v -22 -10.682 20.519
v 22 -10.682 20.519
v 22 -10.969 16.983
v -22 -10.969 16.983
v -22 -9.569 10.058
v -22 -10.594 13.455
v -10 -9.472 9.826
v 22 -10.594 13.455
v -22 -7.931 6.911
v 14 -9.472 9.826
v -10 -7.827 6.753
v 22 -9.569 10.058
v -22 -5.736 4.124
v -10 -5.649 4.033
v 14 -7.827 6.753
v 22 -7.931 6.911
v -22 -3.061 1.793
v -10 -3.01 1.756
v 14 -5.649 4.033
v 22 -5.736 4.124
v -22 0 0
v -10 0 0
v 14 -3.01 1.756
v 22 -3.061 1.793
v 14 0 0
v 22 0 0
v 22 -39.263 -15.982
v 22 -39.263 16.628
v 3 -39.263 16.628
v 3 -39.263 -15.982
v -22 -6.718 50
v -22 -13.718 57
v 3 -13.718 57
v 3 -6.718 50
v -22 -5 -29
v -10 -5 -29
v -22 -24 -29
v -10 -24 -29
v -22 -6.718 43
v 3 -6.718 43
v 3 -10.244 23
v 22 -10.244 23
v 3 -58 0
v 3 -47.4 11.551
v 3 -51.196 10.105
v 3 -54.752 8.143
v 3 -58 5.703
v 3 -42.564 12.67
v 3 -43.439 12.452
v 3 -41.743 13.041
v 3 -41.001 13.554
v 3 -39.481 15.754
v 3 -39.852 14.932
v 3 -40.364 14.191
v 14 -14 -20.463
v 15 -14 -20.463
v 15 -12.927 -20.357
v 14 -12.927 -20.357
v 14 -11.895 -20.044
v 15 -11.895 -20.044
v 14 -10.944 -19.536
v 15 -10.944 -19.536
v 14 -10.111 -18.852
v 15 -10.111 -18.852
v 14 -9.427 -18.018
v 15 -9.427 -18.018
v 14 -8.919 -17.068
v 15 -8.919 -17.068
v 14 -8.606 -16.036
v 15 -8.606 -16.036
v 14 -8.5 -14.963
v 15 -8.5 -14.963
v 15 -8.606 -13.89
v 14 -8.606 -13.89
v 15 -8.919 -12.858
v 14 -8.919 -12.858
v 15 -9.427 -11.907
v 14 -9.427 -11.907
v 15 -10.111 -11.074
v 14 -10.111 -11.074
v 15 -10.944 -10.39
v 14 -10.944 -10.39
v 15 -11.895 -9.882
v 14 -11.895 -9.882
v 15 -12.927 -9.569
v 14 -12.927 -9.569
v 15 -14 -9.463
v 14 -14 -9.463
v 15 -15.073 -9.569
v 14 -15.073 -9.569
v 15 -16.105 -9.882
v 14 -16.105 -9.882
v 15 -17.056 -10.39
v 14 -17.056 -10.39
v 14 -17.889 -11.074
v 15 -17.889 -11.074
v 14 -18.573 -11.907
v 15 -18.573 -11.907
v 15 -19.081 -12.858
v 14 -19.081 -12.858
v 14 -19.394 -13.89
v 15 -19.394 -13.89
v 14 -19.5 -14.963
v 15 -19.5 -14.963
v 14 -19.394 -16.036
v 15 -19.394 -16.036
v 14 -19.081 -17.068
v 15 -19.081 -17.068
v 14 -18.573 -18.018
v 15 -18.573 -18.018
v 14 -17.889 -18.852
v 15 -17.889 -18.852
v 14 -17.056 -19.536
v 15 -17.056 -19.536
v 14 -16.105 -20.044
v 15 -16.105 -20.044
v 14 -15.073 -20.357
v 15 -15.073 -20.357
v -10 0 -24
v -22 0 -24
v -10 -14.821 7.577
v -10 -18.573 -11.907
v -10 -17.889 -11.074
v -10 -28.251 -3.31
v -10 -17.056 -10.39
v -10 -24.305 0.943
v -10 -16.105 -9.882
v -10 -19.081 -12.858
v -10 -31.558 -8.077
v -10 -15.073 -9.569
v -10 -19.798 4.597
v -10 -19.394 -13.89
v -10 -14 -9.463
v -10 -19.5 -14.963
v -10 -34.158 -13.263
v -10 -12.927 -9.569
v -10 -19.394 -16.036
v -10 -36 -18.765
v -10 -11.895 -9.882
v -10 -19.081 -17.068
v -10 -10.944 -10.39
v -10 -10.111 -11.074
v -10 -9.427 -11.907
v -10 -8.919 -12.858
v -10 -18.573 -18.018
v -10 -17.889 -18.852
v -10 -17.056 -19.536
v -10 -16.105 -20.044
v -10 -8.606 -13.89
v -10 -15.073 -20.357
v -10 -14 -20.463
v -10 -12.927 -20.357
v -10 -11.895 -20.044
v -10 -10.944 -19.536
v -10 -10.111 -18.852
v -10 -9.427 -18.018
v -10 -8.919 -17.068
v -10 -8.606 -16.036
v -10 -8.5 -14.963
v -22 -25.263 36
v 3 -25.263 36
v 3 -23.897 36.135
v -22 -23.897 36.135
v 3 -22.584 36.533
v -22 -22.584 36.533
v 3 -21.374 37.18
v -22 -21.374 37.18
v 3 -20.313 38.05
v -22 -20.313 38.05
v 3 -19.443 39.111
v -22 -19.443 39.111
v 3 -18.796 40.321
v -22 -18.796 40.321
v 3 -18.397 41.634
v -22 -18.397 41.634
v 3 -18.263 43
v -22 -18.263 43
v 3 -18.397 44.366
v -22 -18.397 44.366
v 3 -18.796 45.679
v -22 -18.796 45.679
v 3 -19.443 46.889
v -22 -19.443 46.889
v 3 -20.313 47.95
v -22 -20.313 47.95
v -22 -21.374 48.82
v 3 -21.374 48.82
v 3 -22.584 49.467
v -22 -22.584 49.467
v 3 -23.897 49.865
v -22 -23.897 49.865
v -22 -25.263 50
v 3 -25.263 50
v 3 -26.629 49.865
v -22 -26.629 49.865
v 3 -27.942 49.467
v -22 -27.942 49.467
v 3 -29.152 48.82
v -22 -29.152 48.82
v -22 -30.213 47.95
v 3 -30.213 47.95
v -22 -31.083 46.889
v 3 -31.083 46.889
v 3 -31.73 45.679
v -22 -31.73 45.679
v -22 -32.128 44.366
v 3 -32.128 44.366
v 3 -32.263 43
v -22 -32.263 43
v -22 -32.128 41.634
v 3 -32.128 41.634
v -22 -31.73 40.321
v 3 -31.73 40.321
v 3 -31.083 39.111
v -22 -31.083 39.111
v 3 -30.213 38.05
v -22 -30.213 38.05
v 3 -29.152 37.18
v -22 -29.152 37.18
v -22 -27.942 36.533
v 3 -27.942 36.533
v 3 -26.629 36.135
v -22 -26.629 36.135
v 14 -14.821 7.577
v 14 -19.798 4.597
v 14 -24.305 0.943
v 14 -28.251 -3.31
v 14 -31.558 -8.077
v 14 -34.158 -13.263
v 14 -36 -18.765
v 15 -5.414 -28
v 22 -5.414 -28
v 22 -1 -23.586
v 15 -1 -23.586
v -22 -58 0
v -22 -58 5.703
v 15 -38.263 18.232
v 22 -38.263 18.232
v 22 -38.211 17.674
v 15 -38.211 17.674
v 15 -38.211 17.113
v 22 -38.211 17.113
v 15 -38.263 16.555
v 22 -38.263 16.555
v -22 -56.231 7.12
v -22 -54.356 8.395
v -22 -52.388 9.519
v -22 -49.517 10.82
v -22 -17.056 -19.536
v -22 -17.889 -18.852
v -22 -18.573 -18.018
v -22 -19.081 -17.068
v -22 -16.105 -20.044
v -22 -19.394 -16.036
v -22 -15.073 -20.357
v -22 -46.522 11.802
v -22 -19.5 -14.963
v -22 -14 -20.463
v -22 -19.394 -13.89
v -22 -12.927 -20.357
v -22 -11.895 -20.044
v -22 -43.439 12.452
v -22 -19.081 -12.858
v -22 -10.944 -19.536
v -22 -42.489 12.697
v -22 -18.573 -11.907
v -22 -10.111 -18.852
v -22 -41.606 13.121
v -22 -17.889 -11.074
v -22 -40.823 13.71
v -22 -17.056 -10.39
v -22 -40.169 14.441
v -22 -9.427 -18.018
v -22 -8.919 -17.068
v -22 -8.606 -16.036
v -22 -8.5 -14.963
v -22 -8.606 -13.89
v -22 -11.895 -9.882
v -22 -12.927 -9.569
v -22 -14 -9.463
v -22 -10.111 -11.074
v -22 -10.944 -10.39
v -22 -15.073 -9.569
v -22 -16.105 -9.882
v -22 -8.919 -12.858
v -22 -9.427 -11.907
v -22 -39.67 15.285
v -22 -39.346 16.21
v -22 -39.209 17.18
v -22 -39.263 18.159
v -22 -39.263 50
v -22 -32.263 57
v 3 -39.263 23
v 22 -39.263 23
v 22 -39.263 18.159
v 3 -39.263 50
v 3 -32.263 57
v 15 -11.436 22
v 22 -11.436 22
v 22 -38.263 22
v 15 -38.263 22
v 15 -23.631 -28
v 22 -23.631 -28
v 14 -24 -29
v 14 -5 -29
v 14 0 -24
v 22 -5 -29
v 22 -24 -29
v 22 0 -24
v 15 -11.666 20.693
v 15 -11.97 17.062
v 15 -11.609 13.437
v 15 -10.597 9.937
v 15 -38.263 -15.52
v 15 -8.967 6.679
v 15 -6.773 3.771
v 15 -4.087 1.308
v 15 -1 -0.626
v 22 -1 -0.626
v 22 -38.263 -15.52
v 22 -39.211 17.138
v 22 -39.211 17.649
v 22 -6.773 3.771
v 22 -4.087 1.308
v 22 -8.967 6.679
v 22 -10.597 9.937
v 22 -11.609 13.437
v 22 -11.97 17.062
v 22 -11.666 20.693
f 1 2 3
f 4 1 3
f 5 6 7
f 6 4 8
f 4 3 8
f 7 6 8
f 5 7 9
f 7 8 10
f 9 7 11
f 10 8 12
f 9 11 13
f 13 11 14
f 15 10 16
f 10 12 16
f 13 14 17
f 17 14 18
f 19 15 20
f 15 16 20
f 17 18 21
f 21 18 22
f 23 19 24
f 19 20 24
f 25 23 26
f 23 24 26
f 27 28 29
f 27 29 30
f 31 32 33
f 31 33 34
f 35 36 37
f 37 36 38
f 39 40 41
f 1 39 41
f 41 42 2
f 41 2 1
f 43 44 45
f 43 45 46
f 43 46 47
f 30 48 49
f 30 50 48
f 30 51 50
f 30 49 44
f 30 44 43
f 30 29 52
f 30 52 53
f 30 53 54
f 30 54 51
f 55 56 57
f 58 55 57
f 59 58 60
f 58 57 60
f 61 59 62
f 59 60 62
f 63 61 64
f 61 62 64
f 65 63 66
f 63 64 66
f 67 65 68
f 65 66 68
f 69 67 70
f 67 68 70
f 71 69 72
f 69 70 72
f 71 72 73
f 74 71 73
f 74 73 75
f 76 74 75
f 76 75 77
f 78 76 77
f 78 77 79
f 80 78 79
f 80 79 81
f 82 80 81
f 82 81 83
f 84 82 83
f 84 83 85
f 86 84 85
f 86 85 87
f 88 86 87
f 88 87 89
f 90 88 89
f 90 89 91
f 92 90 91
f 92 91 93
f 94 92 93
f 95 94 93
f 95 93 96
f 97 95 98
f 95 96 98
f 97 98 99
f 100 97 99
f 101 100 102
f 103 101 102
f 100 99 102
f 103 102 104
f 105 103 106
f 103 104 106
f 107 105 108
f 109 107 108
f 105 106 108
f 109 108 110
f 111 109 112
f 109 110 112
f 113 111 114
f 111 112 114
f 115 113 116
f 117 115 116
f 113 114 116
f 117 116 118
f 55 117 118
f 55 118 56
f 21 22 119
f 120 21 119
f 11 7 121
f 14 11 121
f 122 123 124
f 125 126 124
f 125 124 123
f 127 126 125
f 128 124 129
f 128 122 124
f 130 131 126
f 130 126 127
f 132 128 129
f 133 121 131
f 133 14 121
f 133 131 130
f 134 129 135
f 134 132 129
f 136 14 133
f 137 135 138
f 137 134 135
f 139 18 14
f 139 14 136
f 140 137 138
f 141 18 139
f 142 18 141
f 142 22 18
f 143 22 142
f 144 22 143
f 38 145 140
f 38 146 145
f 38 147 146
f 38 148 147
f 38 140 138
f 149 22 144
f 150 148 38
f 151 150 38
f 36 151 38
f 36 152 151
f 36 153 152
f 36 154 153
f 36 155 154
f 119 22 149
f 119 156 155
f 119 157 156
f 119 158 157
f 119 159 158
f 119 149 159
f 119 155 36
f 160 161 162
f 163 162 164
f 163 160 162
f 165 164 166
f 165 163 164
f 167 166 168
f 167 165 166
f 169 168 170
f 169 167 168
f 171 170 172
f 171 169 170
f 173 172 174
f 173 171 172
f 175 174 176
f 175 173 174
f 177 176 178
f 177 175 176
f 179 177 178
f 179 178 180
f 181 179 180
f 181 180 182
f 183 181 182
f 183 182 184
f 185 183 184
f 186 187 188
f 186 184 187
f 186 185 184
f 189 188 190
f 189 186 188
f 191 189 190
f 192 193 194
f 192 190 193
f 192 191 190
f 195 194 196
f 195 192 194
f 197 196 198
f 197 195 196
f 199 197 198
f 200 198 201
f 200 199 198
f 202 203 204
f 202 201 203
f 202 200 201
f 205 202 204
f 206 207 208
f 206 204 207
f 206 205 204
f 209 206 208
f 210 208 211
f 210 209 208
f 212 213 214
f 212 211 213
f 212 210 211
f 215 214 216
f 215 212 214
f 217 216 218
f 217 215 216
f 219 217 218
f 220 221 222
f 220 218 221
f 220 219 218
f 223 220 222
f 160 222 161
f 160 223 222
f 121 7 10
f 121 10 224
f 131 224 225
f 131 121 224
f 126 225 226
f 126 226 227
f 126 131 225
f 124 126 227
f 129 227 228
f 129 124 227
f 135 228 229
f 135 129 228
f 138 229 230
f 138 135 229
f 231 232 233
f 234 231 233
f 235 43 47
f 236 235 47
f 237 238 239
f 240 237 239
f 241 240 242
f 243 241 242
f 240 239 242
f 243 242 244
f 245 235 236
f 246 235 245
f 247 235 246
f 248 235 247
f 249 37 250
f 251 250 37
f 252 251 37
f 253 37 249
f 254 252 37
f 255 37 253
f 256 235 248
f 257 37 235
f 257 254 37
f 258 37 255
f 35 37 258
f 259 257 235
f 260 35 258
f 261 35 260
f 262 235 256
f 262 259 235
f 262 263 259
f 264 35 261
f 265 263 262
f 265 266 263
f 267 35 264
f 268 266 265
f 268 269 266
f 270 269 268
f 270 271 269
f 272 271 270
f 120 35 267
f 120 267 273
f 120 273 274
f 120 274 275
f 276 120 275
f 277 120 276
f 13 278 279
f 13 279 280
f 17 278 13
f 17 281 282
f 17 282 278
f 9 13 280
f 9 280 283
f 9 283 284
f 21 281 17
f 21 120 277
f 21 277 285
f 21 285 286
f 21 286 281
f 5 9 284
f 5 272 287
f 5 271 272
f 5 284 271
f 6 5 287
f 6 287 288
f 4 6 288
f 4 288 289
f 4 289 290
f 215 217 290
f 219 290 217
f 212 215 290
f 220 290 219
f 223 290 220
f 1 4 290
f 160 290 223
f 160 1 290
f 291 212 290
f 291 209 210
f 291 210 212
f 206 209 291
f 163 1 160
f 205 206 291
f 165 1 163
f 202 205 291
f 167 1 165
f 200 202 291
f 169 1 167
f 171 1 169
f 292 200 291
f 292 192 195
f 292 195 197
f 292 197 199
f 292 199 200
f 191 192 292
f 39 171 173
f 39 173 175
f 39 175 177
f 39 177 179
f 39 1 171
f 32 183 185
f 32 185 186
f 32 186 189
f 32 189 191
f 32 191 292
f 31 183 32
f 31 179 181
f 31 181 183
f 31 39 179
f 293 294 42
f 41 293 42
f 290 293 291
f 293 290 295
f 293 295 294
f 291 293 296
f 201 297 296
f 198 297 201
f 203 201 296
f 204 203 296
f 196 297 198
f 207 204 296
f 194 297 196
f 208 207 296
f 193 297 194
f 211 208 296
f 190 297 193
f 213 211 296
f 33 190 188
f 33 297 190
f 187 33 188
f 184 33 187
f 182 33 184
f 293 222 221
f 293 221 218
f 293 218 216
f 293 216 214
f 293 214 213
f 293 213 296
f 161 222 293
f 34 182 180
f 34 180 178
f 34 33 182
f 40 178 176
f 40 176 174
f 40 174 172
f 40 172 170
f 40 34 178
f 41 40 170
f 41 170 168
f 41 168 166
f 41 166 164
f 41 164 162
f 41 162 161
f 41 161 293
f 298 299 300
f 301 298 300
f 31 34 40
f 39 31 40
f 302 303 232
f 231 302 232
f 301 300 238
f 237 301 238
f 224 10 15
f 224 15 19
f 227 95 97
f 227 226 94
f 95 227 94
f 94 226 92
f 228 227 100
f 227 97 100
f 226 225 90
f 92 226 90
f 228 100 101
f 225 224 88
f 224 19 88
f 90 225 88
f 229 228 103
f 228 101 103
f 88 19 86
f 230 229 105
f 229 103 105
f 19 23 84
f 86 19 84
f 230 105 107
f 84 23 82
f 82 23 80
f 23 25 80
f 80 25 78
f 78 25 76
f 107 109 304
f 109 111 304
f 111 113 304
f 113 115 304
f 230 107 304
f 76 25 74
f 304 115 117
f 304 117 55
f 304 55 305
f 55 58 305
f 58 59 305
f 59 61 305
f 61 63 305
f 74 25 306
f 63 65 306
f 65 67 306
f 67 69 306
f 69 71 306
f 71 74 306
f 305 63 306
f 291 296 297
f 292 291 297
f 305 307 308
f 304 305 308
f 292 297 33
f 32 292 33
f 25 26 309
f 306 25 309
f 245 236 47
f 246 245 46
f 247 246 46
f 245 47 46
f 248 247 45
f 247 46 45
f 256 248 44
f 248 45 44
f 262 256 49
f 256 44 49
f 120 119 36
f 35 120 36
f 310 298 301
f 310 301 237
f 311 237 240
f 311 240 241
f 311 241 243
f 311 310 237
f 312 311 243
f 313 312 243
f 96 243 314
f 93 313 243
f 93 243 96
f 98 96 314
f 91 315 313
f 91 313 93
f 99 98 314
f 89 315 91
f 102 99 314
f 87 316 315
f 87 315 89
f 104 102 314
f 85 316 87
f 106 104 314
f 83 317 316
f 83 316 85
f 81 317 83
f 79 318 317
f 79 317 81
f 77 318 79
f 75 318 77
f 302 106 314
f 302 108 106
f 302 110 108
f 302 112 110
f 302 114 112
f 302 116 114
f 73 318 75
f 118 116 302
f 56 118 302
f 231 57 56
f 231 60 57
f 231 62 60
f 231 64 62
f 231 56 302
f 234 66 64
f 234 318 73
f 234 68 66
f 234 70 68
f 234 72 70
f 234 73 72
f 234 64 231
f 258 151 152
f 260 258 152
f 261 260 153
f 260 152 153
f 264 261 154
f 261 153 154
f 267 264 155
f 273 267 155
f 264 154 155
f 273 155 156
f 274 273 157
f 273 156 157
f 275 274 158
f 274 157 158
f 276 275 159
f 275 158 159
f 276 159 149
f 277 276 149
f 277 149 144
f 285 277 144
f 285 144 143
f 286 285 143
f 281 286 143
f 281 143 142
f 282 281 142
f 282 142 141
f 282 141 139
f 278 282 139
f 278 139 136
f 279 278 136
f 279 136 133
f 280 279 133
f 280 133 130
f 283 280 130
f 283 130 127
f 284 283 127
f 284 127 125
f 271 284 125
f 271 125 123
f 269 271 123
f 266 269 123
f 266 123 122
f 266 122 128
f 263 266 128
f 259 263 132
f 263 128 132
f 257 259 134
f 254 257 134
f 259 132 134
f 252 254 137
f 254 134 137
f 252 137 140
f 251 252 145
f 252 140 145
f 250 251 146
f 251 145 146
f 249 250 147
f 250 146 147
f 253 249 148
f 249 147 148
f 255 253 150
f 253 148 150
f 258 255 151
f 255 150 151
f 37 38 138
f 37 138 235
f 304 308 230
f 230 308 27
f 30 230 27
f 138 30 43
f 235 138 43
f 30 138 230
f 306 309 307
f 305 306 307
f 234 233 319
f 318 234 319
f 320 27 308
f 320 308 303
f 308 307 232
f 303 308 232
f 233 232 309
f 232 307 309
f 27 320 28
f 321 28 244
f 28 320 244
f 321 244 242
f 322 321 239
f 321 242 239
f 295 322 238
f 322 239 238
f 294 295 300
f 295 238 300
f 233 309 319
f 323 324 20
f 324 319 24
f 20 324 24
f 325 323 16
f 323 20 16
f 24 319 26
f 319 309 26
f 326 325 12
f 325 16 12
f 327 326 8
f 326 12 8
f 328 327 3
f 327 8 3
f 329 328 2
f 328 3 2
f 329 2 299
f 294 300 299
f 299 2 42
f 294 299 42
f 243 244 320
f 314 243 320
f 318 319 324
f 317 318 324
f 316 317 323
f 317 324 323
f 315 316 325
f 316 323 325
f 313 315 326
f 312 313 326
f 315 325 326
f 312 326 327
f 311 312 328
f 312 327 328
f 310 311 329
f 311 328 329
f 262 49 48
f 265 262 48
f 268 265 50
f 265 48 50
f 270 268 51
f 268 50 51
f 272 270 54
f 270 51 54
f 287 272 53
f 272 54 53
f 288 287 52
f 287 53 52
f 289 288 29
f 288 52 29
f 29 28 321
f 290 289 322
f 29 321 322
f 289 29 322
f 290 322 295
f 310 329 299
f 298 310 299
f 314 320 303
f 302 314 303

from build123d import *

# Parameters (mm, degrees)
SKETCH1_R               = 7
BOSS_EXTRUDE3_DEPTH     = 22
SKETCH8_R               = 5.5
CUT_EXTRUDE1_DEPTH      = 46
SKETCH10_W              = 34.059077951
SKETCH10_H              = 32.597107019
CUT_EXTRUDE2_DEPTH      = 19
SKETCH19_R              = 41
CUT_EXTRUDE5_DEPTH      = 14
CUT_EXTRUDE5_DEPTH_BACK = 10
SKETCH21_W              = 39.040087977
SKETCH21_H              = 19
CUT_EXTRUDE7_DEPTH      = 19
CUT_EXTRUDE8_DEPTH      = 7


with BuildPart() as part:
    # Sketch1 → Boss-Extrude3 (new body, symmetric)
    with BuildSketch(Plane(origin=(0, 0, 0), x_dir=(0, 0, -1), z_dir=(1, 0, 0))):
        with BuildLine():
            Line((0, 0), (24, 0))
            Line((24, 0), (29, -5))
            Line((29, -5), (29, -24))
            Line((29, -24), (0, -58))
            Line((0, -58), (-5.703019947, -58))
            ThreePointArc((-5.703019947, -58), (-7.775768892, -55.305839554), (-9.519025669, -52.387647562))
            ThreePointArc((-9.519025669, -52.387647562), (-11.35140658, -48.033040831), (-12.452414435, -43.438696342))
            ThreePointArc((-12.452414435, -43.438696342), (-14.440768413, -40.168970146), (-18.158792561, -39.262903161))
            Line((-18.158792561, -39.262903161), (-50, -39.262903161))
            Line((-50, -39.262903161), (-57, -32.262903161))
            Line((-57, -32.262903161), (-57, -13.71762228))
            Line((-57, -13.71762228), (-50, -6.71762228))
            Line((-50, -6.71762228), (-43, -6.71762228))
            Line((-43, -6.71762228), (-20.519163329, -10.681600334))
            ThreePointArc((-20.519163329, -10.681600334), (-8.446624302, -8.823458857), (0, 0))
        make_face()
        with Locations((-43, -25.262903161)):
            Circle(SKETCH1_R, mode=Mode.SUBTRACT)
    extrude(amount=BOSS_EXTRUDE3_DEPTH, both=True)

    # Sketch8 → Cut-Extrude1 (cut)
    with BuildSketch(Plane(origin=(22, 0, 0), x_dir=(0, 0, -1), z_dir=(1, 0, 0))):
        with Locations((14.962850045, -14)):
            Circle(SKETCH8_R)
    extrude(amount=-CUT_EXTRUDE1_DEPTH, mode=Mode.SUBTRACT)

    # Sketch10 → Cut-Extrude2 (cut)
    with BuildSketch(Plane(origin=(22, 0, 0), x_dir=(0, 0, -1), z_dir=(1, 0, 0))):
        with Locations((-40.029538976, -22.964349652)):
            Rectangle(SKETCH10_W, SKETCH10_H)
    extrude(amount=-CUT_EXTRUDE2_DEPTH, mode=Mode.SUBTRACT)

    # Sketch19 → Cut-Extrude5 (cut, two sides)
    with BuildSketch(Plane(origin=(0, 0, 0), x_dir=(0, 0, -1), z_dir=(1, 0, 0))) as cut_extrude5_sk:
        with Locations((29, 3.701873436)):
            Circle(SKETCH19_R)
    extrude(amount=CUT_EXTRUDE5_DEPTH, mode=Mode.SUBTRACT)
    extrude(cut_extrude5_sk.sketch, amount=-CUT_EXTRUDE5_DEPTH_BACK, mode=Mode.SUBTRACT)

    # Sketch21 → Cut-Extrude7 (cut)
    with BuildSketch(Plane(origin=(22, 0, 0), x_dir=(0, 0, -1), z_dir=(1, 0, 0))):
        with Locations((-3.479956011, -48.762903161)):
            Rectangle(SKETCH21_W, SKETCH21_H)
    extrude(amount=-CUT_EXTRUDE7_DEPTH, mode=Mode.SUBTRACT)

    # Sketch22 → Cut-Extrude8 (cut)
    with BuildSketch(Plane(origin=(22, 0, 0), x_dir=(0, 0, -1), z_dir=(1, 0, 0))):
        with BuildLine():
            Line((-16.554750267, -38.262903161), (15.520235364, -38.262903161))
            Line((15.520235364, -38.262903161), (28, -23.631454967))
            Line((28, -23.631454967), (28, -5.414213562))
            Line((28, -5.414213562), (23.585786438, -1))
            Line((23.585786438, -1), (0.625702461, -1))
            ThreePointArc((0.625702461, -1), (-8.270776569, -9.856396305), (-20.692811507, -11.666408087))
            Line((-20.692811507, -11.666408087), (-22, -11.435915487))
            Line((-22, -11.435915487), (-22, -38.262903161))
            Line((-22, -38.262903161), (-18.232249909, -38.262903161))
            ThreePointArc((-18.232249909, -38.262903161), (-17.393500088, -38.203988815), (-16.554750267, -38.262903161))
        make_face()
    extrude(amount=-CUT_EXTRUDE8_DEPTH, mode=Mode.SUBTRACT)


solid = part.part
